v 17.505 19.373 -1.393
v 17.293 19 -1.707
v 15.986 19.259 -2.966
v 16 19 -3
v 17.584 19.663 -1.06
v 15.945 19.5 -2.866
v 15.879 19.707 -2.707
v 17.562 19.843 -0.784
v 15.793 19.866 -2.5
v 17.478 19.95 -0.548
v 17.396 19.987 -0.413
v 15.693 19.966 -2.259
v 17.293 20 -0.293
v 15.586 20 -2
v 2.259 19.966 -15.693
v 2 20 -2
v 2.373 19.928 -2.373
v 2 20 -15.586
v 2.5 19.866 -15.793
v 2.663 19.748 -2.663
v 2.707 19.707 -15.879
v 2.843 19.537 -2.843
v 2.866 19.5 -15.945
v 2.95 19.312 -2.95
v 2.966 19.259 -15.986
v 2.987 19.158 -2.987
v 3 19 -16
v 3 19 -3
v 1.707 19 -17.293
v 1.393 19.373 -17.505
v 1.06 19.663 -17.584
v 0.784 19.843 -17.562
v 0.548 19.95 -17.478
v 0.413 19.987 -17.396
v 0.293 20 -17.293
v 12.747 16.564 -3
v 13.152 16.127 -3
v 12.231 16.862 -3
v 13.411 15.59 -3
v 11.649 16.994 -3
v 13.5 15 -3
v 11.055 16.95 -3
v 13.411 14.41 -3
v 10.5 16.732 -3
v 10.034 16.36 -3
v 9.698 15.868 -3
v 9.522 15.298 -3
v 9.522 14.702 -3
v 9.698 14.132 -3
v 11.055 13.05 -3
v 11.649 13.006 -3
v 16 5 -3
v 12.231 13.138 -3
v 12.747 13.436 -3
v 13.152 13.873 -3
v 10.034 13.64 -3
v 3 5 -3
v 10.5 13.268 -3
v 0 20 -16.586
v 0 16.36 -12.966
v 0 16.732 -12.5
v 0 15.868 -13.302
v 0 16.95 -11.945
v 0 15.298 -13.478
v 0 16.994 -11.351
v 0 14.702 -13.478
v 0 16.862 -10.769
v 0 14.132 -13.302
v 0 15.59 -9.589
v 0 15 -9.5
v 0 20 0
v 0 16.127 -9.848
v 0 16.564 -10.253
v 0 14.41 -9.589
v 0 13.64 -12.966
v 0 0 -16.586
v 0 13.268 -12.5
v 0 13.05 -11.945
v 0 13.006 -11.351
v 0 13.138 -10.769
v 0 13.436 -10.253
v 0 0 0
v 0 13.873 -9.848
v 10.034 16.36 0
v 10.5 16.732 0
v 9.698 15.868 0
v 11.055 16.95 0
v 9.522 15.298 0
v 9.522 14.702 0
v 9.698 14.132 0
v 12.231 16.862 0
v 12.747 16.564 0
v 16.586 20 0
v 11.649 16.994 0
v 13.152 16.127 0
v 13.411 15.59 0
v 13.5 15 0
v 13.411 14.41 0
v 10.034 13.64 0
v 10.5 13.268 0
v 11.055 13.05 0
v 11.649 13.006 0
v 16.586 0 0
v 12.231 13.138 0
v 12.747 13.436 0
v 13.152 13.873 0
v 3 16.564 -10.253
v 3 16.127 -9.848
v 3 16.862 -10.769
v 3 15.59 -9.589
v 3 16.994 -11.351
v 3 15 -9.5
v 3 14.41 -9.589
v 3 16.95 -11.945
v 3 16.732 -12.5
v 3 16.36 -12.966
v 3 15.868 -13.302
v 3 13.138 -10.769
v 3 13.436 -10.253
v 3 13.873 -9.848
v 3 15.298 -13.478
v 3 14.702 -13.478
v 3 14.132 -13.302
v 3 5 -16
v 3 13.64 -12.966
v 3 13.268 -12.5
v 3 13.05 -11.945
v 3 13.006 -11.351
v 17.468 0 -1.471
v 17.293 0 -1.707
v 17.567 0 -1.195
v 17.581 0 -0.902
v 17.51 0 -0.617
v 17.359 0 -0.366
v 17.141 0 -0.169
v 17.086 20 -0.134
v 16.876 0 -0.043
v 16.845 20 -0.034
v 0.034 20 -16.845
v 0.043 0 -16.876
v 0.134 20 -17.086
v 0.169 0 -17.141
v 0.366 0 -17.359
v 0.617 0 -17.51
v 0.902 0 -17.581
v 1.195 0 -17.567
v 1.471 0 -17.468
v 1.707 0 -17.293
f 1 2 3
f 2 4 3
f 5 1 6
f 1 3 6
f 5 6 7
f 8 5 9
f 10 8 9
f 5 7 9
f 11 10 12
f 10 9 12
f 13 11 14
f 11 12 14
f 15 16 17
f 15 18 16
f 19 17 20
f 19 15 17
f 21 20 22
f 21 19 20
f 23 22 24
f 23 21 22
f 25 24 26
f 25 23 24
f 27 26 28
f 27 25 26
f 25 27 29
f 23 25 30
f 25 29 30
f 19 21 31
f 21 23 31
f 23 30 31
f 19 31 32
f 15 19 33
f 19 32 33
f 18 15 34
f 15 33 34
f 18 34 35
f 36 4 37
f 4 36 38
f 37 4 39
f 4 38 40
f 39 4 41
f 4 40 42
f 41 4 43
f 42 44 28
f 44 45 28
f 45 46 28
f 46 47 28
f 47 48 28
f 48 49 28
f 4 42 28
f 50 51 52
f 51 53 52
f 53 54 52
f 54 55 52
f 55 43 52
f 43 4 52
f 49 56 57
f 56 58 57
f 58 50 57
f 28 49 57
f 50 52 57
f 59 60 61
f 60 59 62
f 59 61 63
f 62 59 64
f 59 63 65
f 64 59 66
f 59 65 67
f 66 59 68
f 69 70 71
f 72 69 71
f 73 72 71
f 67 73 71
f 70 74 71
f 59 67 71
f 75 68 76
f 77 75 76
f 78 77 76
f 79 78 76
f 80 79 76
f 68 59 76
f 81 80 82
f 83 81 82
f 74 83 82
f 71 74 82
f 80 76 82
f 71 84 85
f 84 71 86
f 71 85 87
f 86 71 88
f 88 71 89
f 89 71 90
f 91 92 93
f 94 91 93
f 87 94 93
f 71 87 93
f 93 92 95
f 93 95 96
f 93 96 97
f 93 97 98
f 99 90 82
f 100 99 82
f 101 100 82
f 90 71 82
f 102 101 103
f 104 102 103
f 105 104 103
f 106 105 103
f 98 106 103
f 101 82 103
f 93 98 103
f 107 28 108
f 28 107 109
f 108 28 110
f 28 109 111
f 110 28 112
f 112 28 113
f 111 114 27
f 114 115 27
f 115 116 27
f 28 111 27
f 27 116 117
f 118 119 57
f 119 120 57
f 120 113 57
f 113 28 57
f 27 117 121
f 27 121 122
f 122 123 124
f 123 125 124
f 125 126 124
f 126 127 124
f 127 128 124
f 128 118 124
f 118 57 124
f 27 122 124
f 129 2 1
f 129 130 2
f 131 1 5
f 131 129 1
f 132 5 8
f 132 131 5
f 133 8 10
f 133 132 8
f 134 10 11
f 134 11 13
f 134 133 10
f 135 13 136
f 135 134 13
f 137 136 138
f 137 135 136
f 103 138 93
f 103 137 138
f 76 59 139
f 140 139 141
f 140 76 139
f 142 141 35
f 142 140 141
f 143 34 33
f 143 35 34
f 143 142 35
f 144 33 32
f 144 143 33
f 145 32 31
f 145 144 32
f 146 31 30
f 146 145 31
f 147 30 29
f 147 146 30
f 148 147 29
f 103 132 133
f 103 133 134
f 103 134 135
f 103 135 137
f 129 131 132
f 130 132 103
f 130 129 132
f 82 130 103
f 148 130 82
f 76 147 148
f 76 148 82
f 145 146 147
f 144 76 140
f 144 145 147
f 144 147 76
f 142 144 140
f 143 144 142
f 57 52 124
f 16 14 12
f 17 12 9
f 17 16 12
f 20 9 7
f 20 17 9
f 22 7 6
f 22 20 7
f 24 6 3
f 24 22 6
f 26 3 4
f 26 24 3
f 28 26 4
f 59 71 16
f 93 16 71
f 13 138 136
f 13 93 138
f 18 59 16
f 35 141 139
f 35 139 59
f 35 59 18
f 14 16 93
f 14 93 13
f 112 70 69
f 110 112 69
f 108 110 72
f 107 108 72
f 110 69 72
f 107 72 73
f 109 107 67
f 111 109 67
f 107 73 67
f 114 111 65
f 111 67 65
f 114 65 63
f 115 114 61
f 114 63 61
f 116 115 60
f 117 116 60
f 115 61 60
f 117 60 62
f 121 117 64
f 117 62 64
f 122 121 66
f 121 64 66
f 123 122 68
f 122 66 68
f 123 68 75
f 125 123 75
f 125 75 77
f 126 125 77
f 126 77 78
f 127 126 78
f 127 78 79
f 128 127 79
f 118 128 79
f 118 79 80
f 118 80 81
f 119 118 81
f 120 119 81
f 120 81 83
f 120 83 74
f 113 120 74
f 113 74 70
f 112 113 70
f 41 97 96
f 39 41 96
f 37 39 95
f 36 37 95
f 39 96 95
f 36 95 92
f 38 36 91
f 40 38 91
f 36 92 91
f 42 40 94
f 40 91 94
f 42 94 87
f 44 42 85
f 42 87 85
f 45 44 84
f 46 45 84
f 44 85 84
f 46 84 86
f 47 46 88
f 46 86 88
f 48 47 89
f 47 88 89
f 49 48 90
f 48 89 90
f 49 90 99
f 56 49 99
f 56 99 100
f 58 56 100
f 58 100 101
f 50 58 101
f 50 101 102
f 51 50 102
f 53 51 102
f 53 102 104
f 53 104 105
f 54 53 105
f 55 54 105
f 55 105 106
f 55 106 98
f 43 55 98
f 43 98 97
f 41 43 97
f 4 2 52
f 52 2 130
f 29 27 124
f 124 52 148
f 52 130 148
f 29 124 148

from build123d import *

# Parameters (mm, degrees)
BOSS_EXTRUDE1_DEPTH = 5
BOSS_EXTRUDE2_DEPTH = 15
SKETCH3_R           = 2
CUT_EXTRUDE1_DEPTH  = 34.496268449
SKETCH4_R           = 2
CUT_EXTRUDE2_DEPTH  = 34.496268449
FILLET1_R           = 1


with BuildPart() as part:
    # Sketch1 → Boss-Extrude1 (new body)
    with BuildSketch(Plane(origin=(0, 0, 0), x_dir=(1, 0, 0), z_dir=(0, 1, 0))):
        Polygon((0, 0), (0, 19), (19, 0), align=None)
    extrude(amount=BOSS_EXTRUDE1_DEPTH)

    # Sketch2 → Boss-Extrude2 (add)
    with BuildSketch(Plane(origin=(0, 5, 0), x_dir=(1, 0, 0), z_dir=(0, 1, 0))):
        Polygon((0, 19), (0, 0), (19, 0), (16, 3), (3, 3), (3, 16), align=None)
    extrude(amount=BOSS_EXTRUDE2_DEPTH)

    # Sketch3 → Cut-Extrude1 (cut, through all)
    with BuildSketch(Plane.XY):
        with Locations((11.5, 15)):
            Circle(SKETCH3_R)
    extrude(amount=-CUT_EXTRUDE1_DEPTH, mode=Mode.SUBTRACT)

    # Sketch4 → Cut-Extrude2 (cut, through all)
    with BuildSketch(Plane.ZY):
        with Locations((-11.5, 15)):
            Circle(SKETCH4_R)
    extrude(amount=-CUT_EXTRUDE2_DEPTH, mode=Mode.SUBTRACT)

    # Fillet1
    fillet1_edges = [part.edges().sort_by_distance(p)[0] for p in [
        (9.5, 20, -3),
        (3, 20, -9.5),
        (1.5, 20, -17.5),
        (17.5, 20, -1.5),
        (19, 10, 0),
        (0, 10, -19),
    ]]
    fillet(fillet1_edges, radius=FILLET1_R)


solid = part.part
